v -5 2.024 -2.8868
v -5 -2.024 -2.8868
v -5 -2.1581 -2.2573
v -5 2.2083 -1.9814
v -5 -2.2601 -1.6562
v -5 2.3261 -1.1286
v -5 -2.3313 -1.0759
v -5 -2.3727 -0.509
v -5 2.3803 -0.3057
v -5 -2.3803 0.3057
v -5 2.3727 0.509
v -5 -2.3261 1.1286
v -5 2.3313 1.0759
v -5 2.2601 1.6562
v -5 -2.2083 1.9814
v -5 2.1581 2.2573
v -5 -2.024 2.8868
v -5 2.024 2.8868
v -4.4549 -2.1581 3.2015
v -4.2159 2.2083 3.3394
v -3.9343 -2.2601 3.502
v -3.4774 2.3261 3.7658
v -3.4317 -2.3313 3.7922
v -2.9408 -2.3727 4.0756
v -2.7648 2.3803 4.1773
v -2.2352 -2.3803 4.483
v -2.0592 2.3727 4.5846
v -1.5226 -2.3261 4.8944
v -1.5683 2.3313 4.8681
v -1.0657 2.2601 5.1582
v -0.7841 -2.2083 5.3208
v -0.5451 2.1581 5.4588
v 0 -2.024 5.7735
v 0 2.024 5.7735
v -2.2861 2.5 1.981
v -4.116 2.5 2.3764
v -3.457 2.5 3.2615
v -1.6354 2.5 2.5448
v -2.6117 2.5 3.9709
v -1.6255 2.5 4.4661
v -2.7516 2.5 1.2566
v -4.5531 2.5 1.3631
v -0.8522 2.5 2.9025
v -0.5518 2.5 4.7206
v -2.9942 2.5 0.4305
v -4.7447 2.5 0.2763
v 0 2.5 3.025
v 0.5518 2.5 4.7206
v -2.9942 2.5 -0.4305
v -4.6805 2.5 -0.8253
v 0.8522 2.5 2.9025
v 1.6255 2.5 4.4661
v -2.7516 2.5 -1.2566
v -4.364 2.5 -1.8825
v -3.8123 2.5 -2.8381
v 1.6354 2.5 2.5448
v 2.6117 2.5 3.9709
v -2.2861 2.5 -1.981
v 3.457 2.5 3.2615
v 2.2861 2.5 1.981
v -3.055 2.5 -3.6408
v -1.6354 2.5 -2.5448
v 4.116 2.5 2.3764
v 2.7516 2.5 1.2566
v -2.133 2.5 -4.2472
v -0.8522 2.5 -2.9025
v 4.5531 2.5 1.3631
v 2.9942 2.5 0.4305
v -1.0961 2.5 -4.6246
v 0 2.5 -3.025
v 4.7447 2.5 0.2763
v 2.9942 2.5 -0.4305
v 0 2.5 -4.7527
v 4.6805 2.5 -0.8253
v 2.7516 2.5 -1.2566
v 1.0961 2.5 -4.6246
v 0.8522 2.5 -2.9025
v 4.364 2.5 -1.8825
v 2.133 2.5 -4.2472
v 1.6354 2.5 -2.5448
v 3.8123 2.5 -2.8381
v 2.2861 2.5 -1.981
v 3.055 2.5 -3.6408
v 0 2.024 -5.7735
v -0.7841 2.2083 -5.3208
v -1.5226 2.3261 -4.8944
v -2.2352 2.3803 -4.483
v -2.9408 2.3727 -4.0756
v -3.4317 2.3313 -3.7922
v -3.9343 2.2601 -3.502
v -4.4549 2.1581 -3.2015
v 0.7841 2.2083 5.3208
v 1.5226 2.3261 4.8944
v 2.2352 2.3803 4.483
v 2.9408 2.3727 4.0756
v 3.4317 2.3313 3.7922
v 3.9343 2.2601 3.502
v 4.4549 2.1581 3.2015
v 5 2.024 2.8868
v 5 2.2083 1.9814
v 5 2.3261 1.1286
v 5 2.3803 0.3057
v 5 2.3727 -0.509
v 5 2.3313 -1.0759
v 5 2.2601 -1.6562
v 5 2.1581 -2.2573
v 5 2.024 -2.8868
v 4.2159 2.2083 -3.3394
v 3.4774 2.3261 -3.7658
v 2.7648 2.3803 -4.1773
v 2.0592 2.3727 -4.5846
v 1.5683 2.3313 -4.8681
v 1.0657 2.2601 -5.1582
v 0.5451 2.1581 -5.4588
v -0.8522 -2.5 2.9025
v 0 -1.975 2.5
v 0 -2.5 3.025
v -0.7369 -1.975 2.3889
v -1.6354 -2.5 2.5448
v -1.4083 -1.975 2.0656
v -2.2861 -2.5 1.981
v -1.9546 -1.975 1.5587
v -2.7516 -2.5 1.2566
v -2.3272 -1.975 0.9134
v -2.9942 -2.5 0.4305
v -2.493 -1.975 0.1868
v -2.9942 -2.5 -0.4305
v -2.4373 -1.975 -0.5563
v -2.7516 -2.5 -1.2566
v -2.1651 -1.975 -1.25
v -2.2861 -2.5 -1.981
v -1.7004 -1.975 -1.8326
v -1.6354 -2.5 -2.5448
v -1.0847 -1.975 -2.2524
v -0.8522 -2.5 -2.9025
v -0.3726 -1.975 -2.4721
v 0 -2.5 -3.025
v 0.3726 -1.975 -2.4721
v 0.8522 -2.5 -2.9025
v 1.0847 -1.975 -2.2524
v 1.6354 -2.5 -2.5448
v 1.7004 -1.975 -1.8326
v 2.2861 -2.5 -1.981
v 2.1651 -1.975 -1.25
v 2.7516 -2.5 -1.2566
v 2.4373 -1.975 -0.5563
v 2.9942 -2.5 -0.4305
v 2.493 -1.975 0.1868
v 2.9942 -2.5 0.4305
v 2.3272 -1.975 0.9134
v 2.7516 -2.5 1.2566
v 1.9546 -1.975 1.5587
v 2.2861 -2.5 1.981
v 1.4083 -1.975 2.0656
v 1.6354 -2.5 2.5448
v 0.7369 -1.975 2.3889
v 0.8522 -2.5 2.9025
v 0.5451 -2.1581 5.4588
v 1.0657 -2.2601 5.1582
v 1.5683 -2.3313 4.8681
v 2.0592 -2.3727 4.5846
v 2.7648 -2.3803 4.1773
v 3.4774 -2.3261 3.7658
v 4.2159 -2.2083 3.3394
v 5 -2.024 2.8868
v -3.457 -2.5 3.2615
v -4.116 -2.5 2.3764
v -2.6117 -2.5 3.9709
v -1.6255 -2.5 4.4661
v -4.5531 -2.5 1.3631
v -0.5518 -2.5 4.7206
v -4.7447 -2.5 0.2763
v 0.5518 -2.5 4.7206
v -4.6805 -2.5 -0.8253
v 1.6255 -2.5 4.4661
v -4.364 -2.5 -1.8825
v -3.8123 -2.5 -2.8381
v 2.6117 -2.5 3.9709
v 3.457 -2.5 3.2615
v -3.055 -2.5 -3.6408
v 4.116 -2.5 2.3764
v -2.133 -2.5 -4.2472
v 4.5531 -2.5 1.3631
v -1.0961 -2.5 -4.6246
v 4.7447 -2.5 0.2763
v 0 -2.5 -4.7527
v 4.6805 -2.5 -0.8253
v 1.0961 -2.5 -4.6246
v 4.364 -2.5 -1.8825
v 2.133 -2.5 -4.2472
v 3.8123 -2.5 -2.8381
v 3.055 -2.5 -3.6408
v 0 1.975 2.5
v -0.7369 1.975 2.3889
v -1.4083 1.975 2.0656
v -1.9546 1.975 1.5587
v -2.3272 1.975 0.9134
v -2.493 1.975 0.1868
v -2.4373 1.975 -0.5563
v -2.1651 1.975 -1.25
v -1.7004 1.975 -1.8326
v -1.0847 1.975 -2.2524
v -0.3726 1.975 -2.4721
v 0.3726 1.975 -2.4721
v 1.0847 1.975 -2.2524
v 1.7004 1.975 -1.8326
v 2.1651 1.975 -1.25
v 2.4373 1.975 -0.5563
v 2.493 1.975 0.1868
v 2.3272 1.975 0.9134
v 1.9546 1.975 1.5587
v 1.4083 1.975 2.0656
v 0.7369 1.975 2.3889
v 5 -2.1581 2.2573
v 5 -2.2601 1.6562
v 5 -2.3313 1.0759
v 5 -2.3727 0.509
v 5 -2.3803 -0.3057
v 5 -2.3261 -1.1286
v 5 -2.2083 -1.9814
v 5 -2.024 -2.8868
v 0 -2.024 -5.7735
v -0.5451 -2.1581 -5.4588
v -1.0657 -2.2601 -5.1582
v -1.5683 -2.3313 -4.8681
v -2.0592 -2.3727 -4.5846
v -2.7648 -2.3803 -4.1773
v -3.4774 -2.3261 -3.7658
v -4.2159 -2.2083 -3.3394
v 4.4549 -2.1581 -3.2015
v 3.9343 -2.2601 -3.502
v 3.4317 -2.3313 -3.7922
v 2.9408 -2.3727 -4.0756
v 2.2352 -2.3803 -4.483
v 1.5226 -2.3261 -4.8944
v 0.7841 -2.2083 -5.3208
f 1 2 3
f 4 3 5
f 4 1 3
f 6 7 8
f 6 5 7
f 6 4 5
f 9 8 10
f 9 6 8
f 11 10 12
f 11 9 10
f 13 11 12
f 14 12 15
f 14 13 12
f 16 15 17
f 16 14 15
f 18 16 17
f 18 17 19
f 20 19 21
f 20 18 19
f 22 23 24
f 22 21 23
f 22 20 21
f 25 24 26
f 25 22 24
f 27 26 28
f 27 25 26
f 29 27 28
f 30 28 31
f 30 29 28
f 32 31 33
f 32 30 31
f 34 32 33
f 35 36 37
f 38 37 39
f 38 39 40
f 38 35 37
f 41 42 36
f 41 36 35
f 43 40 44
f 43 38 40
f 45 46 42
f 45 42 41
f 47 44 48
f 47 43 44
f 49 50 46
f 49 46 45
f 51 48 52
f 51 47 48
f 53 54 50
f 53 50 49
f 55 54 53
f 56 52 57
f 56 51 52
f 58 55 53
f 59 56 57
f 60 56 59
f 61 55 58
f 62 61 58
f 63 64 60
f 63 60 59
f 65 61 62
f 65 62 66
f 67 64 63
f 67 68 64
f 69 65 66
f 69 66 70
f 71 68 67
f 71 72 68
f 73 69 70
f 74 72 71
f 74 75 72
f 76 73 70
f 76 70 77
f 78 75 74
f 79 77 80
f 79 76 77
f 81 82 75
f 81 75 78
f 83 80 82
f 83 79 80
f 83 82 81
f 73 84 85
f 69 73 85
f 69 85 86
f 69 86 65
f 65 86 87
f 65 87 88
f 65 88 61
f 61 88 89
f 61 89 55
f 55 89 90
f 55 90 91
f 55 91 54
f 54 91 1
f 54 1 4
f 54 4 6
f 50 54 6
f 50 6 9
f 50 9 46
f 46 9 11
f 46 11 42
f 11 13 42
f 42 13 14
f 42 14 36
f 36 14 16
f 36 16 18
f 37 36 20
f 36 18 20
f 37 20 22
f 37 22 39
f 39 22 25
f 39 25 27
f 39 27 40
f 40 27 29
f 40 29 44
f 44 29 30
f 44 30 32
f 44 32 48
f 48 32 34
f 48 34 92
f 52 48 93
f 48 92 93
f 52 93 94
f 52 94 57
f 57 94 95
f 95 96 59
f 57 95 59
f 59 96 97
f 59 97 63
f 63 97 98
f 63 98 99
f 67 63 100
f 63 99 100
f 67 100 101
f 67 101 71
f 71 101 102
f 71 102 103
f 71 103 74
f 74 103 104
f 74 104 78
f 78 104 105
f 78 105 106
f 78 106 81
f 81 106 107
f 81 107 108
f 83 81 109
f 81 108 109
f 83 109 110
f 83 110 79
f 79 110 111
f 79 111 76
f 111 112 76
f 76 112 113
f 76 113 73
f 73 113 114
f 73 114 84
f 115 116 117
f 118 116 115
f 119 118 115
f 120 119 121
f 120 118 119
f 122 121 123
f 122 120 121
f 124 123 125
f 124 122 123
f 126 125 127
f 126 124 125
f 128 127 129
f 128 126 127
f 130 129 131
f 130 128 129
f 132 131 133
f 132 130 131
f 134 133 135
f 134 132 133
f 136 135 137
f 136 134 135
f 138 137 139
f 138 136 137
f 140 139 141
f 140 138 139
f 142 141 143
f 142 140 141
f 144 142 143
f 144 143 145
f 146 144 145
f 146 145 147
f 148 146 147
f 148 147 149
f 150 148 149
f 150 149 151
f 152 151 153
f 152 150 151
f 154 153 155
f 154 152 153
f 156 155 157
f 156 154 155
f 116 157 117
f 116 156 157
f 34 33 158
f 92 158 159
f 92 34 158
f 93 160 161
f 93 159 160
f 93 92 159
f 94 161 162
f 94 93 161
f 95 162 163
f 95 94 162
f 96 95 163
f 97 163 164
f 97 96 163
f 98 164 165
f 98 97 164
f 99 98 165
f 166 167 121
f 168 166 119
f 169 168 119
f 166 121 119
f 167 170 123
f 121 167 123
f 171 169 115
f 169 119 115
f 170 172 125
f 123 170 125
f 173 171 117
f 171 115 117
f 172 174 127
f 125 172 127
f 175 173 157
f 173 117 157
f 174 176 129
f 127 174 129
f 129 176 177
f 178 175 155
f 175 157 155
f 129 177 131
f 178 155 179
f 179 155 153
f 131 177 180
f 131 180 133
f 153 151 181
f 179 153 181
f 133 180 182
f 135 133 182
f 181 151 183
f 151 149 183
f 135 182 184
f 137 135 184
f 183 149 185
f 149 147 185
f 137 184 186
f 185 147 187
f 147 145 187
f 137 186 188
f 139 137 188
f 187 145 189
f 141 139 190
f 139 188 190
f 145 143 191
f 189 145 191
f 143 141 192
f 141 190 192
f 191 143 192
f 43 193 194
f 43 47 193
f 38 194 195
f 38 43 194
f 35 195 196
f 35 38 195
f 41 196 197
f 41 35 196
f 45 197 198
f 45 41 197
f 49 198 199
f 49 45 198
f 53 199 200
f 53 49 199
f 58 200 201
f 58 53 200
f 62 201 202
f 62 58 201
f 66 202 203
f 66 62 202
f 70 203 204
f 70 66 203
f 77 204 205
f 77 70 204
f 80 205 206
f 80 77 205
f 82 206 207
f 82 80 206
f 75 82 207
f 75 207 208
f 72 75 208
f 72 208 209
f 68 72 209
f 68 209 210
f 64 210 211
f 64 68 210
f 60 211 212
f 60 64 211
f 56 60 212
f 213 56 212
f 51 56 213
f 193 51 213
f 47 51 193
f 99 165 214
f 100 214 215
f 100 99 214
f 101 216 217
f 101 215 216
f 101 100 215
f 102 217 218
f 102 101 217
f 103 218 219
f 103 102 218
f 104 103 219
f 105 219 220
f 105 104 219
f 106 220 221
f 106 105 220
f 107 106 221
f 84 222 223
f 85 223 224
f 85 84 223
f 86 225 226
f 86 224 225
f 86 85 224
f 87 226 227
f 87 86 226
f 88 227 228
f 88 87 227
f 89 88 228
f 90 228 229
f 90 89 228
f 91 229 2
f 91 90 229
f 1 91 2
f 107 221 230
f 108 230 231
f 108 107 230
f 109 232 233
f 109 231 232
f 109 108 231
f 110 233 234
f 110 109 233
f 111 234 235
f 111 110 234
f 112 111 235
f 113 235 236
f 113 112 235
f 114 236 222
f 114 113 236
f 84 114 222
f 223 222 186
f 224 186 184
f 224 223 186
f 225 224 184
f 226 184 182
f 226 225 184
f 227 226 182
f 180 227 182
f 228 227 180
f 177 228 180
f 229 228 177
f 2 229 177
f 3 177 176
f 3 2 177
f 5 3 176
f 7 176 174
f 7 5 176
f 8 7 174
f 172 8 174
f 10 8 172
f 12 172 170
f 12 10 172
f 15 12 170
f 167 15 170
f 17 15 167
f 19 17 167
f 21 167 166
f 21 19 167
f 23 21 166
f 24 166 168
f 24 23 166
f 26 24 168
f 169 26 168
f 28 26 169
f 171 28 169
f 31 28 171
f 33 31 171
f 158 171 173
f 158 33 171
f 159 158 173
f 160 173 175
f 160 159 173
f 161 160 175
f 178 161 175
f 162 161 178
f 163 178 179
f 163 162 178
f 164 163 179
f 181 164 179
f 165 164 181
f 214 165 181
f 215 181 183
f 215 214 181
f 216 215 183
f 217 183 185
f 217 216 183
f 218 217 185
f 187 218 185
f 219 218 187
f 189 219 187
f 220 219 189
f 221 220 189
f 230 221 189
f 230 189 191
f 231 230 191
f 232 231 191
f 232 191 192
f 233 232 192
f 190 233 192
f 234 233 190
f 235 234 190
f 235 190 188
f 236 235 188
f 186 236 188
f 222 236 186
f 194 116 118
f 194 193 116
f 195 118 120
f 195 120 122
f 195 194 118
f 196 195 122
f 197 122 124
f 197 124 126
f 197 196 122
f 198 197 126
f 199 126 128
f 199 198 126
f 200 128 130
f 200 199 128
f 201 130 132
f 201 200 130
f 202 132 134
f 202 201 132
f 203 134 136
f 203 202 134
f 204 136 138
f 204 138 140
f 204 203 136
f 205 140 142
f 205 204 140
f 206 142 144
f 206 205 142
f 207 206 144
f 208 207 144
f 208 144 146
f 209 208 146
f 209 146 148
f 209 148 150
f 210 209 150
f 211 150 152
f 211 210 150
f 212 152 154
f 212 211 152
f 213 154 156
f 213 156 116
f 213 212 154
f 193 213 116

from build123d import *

# Parameters (mm, degrees)
BOSS_EXTRUDE1_DEPTH = 2.5


with BuildPart() as part:
    # Sketch1 → Boss-Extrude1 (new, symmetric)
    with BuildSketch(Plane(origin=(0, 0, 0), x_dir=(1, 0, 0), z_dir=(0, 1, 0))):
        Polygon((0, 5.773502692), (-5, 2.886751346), (-5, -2.886751346), (0, -5.773502692), (5, -2.886751346), (5, 2.886751346), align=None)
    extrude(amount=BOSS_EXTRUDE1_DEPTH, both=True)

    # Sketch2 → Cut-Revolve1 (revolve, cut)
    with BuildSketch(Plane.XY, mode=Mode.PRIVATE) as cut_revolve1_sk:
        Polygon((-4.75274654, 2.5), (-5.825, 2), (-5.825, 2.5), align=None)
    cut_revolve1 = revolve(cut_revolve1_sk.sketch.rotate(Axis((0, 0, 0), (0, 1, 0)), 270), axis=Axis((0, 0, 0), (0, 1, 0)), mode=Mode.SUBTRACT)

    # Mirror1: Cut-Revolve1 across plane
    add(cut_revolve1.mirror(Plane.ZX), mode=Mode.SUBTRACT)

    # Sketch4 → M6 Tapped Hole1 (revolve, cut)
    with BuildSketch(Plane(origin=(0, 2.5, 0), x_dir=(0, 0, 1), z_dir=(1, 0, 0))):
        Polygon((0, 0), (0, 5), (3.025, 5), (2.5, 4.475), (2.5, 0.525), (3.025, 0), align=None)
    revolve(axis=Axis((0, 8.85, 0), (0, -1, 0)), mode=Mode.SUBTRACT)


solid = part.part
